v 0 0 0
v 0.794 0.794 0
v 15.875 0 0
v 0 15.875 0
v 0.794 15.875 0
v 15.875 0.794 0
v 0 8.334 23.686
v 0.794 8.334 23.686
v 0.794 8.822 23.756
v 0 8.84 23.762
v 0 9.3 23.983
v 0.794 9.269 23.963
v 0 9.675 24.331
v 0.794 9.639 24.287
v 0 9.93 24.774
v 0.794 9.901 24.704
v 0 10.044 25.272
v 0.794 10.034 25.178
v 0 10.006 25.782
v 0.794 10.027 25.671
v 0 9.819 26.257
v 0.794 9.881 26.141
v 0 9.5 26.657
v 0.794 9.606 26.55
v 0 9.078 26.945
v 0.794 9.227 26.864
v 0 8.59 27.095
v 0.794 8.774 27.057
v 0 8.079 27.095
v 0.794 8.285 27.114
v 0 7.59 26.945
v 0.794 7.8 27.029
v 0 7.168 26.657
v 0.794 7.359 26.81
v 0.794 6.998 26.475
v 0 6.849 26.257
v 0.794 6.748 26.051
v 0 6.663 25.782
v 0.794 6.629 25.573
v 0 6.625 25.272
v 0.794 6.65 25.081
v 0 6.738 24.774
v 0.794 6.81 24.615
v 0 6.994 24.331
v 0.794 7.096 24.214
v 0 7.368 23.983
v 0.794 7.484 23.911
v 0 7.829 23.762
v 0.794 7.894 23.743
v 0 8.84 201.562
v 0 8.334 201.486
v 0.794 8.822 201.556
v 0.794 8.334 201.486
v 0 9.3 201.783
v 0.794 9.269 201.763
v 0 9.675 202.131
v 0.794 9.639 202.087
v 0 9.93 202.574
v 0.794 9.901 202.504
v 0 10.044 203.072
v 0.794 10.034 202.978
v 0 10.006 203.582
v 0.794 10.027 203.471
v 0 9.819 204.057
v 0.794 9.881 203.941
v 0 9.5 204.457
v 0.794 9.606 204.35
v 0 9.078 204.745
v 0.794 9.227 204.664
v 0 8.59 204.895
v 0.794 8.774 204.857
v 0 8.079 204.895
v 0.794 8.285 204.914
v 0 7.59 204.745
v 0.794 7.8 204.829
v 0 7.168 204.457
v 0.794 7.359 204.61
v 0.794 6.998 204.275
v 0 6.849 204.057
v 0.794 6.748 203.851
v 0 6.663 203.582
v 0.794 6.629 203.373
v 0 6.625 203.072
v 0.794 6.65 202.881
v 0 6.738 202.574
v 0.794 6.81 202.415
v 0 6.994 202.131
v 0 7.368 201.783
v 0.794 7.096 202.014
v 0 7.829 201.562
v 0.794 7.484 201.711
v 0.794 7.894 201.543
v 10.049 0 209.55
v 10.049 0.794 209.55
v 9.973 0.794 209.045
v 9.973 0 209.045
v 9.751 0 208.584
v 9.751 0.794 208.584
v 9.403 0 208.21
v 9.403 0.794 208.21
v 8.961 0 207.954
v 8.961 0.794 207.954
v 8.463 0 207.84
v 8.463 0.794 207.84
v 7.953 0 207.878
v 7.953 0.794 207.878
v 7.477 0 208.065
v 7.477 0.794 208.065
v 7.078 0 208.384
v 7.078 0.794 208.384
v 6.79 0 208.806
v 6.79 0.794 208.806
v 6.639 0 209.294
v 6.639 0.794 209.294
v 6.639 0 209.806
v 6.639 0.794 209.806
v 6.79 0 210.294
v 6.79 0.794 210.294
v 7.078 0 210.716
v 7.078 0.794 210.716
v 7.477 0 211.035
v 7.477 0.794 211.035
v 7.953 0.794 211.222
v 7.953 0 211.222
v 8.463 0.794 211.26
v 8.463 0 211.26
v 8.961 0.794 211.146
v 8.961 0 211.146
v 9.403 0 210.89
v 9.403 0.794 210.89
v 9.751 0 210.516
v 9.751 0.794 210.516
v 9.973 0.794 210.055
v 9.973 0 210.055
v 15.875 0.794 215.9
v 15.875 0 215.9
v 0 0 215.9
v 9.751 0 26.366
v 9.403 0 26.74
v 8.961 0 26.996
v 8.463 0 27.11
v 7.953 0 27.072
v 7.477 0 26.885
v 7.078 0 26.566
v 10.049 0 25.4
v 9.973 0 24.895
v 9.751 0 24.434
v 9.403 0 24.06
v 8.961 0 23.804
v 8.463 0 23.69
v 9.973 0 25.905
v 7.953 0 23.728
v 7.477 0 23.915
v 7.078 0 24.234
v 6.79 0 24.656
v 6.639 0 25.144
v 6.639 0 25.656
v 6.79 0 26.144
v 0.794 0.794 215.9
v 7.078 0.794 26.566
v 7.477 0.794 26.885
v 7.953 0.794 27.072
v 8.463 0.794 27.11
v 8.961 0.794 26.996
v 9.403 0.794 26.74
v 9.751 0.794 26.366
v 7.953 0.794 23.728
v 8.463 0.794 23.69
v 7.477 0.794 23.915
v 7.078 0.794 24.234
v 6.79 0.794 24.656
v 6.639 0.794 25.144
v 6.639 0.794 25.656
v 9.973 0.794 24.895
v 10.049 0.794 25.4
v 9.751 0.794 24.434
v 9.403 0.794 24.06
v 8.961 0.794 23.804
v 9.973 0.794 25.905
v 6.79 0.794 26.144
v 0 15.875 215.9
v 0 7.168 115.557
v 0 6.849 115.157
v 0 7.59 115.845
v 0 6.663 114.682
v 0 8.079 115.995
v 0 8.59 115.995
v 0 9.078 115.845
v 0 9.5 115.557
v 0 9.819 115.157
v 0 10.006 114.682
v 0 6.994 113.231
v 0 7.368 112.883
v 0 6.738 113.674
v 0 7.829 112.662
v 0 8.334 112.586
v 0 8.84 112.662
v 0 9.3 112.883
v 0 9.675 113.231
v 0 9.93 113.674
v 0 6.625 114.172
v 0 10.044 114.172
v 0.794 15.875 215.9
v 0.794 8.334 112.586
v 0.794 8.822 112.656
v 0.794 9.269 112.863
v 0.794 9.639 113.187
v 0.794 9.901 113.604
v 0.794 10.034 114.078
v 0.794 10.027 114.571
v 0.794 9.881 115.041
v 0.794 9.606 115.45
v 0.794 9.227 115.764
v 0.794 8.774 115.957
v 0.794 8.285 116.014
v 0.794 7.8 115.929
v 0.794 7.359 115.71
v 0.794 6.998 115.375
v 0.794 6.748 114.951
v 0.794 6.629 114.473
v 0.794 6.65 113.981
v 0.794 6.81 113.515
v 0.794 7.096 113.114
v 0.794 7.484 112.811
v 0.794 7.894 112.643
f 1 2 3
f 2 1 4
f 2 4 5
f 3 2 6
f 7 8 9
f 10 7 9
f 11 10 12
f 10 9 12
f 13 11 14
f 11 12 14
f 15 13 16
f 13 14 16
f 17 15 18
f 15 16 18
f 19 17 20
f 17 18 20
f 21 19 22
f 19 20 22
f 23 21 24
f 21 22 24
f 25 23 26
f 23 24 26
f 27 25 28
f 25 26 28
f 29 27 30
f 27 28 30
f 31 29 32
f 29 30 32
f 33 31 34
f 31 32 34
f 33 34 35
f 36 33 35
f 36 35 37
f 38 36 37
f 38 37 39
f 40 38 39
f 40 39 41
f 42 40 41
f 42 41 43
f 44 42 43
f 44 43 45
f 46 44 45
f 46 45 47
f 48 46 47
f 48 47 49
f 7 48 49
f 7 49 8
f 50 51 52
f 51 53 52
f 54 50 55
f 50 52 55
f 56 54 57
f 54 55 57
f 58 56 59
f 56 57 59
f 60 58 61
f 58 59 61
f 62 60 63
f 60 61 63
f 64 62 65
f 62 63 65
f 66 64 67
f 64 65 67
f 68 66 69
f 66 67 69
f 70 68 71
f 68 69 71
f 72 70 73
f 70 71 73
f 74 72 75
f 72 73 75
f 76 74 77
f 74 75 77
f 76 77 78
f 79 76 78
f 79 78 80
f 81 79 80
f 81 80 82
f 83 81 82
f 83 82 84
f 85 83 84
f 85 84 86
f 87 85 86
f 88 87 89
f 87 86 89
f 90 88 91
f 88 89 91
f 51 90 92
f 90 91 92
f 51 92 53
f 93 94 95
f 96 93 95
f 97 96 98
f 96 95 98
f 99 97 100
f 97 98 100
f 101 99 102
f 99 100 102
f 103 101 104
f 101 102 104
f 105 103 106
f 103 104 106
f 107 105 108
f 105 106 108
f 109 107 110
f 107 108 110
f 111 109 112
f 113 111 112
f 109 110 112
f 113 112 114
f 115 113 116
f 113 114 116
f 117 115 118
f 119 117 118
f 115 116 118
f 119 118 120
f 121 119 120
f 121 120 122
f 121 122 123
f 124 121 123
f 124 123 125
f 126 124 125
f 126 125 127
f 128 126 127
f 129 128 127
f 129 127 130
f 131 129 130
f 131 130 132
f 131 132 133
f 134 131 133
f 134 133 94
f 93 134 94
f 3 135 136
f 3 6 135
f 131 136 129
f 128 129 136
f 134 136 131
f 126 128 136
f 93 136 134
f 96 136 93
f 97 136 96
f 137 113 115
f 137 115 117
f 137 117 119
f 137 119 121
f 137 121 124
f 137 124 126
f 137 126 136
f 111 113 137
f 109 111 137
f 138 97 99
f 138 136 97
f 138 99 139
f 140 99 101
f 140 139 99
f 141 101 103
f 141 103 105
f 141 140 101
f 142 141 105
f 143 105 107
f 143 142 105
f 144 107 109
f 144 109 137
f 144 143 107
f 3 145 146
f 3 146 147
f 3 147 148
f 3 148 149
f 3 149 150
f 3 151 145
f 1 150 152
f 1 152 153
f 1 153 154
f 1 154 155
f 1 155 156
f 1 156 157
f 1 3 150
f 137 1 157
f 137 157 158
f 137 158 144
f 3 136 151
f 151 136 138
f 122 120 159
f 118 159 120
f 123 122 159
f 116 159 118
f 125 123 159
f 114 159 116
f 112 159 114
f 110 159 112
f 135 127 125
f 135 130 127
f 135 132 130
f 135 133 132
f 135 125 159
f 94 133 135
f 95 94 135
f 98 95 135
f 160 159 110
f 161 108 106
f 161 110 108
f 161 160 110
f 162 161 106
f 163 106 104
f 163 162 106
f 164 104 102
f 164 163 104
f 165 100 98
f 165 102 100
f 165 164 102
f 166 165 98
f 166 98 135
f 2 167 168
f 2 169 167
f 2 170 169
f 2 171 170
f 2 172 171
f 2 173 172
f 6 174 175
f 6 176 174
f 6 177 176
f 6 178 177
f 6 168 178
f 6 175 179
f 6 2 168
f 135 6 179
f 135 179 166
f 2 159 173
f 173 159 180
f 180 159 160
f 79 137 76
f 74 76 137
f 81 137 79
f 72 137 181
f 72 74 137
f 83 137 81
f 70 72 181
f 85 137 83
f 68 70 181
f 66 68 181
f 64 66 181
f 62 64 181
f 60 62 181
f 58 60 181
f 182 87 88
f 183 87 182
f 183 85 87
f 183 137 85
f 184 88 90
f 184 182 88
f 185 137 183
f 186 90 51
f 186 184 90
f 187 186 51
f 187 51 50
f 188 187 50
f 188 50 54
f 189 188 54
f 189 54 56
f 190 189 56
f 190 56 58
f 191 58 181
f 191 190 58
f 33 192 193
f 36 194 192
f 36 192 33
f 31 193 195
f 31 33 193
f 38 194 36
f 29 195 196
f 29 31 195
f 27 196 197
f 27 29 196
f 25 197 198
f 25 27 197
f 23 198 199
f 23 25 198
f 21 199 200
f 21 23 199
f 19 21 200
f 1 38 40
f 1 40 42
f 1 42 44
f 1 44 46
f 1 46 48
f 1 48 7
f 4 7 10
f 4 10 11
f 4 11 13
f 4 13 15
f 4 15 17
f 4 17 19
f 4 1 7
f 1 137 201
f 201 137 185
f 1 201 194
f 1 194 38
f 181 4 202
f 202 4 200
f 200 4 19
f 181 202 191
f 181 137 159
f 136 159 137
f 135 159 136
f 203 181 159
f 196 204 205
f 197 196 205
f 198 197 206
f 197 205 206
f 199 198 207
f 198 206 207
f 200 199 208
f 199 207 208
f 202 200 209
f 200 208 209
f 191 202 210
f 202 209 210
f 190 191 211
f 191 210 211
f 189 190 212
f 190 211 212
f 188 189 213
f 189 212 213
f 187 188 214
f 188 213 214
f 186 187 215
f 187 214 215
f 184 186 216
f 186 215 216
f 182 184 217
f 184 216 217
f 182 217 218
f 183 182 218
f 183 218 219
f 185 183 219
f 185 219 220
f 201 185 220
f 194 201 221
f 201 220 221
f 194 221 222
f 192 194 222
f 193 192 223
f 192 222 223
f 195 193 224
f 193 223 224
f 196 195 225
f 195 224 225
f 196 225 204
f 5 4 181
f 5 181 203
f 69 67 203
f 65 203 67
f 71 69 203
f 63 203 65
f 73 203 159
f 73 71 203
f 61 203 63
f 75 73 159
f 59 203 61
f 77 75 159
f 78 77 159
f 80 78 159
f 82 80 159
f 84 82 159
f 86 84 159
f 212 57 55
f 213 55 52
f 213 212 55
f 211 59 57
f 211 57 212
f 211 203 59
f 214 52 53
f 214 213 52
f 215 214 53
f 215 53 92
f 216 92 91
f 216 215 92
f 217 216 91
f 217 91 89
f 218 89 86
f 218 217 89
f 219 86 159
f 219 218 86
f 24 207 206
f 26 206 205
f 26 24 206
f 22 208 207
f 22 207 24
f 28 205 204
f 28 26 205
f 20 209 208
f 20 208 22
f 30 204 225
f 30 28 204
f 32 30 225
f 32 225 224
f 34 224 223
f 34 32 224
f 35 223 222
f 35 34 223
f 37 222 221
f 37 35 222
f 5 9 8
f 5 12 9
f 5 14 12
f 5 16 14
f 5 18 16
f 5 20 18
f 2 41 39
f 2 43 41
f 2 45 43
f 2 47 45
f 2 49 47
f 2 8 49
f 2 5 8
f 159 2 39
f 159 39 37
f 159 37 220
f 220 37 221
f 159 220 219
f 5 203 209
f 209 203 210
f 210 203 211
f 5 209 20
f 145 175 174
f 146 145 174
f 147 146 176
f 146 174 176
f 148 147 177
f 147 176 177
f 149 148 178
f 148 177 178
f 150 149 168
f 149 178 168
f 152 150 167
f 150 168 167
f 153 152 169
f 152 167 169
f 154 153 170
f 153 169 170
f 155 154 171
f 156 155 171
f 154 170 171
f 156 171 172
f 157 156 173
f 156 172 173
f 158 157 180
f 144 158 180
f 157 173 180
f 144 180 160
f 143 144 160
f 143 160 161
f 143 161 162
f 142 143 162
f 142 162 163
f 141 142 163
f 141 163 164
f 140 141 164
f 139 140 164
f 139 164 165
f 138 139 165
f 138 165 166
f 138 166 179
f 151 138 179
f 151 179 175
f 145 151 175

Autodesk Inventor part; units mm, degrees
ref_plane "YZ Plane" through (0, 0, 0) normal (1, 0, 0) x (0, 1, 0)
ref_plane "XZ Plane" through (0, 0, 0) normal (0, 1, 0) x (-1, 0, 0)
ref_plane "XY Plane" through (0, 0, 0) normal (0, 0, 1) x (1, 0, 0)
sketch "Sketch1" plane through (0, 0, 0) normal (0, 0, 1) x (1, 0, 0)
  line L0 (0, 0) -> (0, 15.875)
  line L1 (0, 15.875) -> (0.7937, 15.875)
  line L2 (0.7937, 15.875) -> (0.7938, 0.7937)
  line L3 (0.7938, 0.7937) -> (15.875, 0.7937)
  line L4 (15.875, 0.7937) -> (15.875, 0)
  line L5 (15.875, 0) -> (0, 0)
  dimension "d0" = 15.875
  dimension "d1" = 0.7937
extrude "Extrusion1" add sketch "Sketch1" along normal blind 215.9
sketch "Sketch2" plane through (0.7938, 0.7937, 0) normal (0, 1, 0) x (1, 0, 0)
  line L0 (0, 0) -> (15.0812, 0) projected
  line L1 (15.0812, -215.9) -> (0, -215.9) projected
  line L2 (7.5406, 0) -> (7.5406, -215.9) construction
  circle A0 centre (7.5406, -25.4) radius 1.7145
  circle A1 centre (7.5406, -209.55) radius 1.7145
  point P0 (-0.7938, 0)
  dimension "d4" = 25.4
  dimension "d5" = 3.429
  dimension "d6" = 215.9
  dimension "d28" = 6.35
sketch "Sketch3" plane through (0.7938, 0.7937, 0) normal (1, 0, 0) x (0, 0, -1)
  line L0 (0, 15.0812) -> (0, 0) projected
  line L1 (-215.9, 0) -> (-215.9, 15.0812) projected
  line L2 (-215.9, 7.5406) -> (0, 7.5406) construction
  circle A0 centre (-25.4, 7.5406) radius 1.7145
  circle A1 centre (-114.3, 7.5406) radius 1.7145
  circle A2 centre (-203.2, 7.5406) radius 1.7145
  point P0 (0, -0.7937)
  dimension "d14" = 3.429
  dimension "d15" = 25.4
  dimension "d16" = 215.9
  dimension "d19" = 88.9
extrude "Extrusion2" cut sketch "Sketch2" against normal through all
extrude "Extrusion3" cut sketch "Sketch3" against normal through all
properties part number "Hopper Bracing Right Leg P13" material "Aluminum 6061"
